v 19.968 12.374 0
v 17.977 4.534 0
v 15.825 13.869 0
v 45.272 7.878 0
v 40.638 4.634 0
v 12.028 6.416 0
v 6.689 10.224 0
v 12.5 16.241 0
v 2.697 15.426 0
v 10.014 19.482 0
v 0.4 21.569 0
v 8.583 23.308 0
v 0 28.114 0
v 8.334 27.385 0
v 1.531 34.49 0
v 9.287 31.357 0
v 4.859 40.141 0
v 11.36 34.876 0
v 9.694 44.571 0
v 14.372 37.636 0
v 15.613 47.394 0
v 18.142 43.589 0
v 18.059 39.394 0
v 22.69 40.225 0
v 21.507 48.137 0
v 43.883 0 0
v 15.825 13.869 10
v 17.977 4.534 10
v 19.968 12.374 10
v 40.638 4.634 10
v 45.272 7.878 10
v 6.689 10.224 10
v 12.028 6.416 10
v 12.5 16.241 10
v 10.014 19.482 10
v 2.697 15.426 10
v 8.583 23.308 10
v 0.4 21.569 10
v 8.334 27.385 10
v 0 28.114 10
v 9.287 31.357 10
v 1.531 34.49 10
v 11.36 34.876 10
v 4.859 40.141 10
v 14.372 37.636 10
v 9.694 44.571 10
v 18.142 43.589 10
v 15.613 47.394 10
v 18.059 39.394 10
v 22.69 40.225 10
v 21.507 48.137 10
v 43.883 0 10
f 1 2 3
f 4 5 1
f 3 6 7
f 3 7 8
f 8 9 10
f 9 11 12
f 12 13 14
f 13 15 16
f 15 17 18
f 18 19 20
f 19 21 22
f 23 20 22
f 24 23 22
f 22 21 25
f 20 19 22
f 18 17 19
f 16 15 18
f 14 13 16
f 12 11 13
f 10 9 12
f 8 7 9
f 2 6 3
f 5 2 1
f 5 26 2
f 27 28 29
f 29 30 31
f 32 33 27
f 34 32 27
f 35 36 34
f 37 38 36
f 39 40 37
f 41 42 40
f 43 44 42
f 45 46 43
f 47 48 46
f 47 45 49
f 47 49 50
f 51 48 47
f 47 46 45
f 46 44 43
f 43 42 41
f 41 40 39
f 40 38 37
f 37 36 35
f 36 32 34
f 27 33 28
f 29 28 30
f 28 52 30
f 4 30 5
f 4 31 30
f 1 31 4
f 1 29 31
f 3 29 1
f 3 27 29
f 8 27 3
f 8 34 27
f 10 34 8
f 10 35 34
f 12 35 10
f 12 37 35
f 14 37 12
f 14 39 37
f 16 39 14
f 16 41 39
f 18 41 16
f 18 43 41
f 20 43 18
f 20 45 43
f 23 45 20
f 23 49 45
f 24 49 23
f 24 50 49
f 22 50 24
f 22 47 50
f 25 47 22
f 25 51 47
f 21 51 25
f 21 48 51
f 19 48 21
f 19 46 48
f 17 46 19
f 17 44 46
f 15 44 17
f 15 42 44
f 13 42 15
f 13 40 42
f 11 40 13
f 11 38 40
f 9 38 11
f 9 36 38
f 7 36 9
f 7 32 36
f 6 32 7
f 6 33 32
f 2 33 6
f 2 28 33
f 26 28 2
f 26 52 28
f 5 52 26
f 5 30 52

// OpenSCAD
$fn = 32;

// ----------------------------------------------------------------------
// Hook plate: curl radius 18 mm over 170 degrees, 8 mm thick band
// ----------------------------------------------------------------------

// --- parameters (mm) ---
profile_height = 10;      // extrusion height
profile_points = 26;      // points of the closed outline

profile = [[18.142, 43.589], [21.507, 48.137], [15.613, 47.394], [9.694, 44.571], [4.859, 40.141], [1.531, 34.49], [0, 28.114], [0.4, 21.569], [2.697, 15.426], [6.689, 10.224], [12.028, 6.416], [17.977, 4.534], [43.883, 0], [40.638, 4.634], [45.272, 7.878], [19.968, 12.374], [15.825, 13.869], [12.5, 16.241], [10.014, 19.482], [8.583, 23.308], [8.334, 27.385], [9.287, 31.357], [11.36, 34.876], [14.372, 37.636], [18.059, 39.394], [22.69, 40.225]];  // single closed polygon, 26 points, counter clockwise

// --- the one profile operation ---
linear_extrude(height = profile_height) polygon(points = profile);
